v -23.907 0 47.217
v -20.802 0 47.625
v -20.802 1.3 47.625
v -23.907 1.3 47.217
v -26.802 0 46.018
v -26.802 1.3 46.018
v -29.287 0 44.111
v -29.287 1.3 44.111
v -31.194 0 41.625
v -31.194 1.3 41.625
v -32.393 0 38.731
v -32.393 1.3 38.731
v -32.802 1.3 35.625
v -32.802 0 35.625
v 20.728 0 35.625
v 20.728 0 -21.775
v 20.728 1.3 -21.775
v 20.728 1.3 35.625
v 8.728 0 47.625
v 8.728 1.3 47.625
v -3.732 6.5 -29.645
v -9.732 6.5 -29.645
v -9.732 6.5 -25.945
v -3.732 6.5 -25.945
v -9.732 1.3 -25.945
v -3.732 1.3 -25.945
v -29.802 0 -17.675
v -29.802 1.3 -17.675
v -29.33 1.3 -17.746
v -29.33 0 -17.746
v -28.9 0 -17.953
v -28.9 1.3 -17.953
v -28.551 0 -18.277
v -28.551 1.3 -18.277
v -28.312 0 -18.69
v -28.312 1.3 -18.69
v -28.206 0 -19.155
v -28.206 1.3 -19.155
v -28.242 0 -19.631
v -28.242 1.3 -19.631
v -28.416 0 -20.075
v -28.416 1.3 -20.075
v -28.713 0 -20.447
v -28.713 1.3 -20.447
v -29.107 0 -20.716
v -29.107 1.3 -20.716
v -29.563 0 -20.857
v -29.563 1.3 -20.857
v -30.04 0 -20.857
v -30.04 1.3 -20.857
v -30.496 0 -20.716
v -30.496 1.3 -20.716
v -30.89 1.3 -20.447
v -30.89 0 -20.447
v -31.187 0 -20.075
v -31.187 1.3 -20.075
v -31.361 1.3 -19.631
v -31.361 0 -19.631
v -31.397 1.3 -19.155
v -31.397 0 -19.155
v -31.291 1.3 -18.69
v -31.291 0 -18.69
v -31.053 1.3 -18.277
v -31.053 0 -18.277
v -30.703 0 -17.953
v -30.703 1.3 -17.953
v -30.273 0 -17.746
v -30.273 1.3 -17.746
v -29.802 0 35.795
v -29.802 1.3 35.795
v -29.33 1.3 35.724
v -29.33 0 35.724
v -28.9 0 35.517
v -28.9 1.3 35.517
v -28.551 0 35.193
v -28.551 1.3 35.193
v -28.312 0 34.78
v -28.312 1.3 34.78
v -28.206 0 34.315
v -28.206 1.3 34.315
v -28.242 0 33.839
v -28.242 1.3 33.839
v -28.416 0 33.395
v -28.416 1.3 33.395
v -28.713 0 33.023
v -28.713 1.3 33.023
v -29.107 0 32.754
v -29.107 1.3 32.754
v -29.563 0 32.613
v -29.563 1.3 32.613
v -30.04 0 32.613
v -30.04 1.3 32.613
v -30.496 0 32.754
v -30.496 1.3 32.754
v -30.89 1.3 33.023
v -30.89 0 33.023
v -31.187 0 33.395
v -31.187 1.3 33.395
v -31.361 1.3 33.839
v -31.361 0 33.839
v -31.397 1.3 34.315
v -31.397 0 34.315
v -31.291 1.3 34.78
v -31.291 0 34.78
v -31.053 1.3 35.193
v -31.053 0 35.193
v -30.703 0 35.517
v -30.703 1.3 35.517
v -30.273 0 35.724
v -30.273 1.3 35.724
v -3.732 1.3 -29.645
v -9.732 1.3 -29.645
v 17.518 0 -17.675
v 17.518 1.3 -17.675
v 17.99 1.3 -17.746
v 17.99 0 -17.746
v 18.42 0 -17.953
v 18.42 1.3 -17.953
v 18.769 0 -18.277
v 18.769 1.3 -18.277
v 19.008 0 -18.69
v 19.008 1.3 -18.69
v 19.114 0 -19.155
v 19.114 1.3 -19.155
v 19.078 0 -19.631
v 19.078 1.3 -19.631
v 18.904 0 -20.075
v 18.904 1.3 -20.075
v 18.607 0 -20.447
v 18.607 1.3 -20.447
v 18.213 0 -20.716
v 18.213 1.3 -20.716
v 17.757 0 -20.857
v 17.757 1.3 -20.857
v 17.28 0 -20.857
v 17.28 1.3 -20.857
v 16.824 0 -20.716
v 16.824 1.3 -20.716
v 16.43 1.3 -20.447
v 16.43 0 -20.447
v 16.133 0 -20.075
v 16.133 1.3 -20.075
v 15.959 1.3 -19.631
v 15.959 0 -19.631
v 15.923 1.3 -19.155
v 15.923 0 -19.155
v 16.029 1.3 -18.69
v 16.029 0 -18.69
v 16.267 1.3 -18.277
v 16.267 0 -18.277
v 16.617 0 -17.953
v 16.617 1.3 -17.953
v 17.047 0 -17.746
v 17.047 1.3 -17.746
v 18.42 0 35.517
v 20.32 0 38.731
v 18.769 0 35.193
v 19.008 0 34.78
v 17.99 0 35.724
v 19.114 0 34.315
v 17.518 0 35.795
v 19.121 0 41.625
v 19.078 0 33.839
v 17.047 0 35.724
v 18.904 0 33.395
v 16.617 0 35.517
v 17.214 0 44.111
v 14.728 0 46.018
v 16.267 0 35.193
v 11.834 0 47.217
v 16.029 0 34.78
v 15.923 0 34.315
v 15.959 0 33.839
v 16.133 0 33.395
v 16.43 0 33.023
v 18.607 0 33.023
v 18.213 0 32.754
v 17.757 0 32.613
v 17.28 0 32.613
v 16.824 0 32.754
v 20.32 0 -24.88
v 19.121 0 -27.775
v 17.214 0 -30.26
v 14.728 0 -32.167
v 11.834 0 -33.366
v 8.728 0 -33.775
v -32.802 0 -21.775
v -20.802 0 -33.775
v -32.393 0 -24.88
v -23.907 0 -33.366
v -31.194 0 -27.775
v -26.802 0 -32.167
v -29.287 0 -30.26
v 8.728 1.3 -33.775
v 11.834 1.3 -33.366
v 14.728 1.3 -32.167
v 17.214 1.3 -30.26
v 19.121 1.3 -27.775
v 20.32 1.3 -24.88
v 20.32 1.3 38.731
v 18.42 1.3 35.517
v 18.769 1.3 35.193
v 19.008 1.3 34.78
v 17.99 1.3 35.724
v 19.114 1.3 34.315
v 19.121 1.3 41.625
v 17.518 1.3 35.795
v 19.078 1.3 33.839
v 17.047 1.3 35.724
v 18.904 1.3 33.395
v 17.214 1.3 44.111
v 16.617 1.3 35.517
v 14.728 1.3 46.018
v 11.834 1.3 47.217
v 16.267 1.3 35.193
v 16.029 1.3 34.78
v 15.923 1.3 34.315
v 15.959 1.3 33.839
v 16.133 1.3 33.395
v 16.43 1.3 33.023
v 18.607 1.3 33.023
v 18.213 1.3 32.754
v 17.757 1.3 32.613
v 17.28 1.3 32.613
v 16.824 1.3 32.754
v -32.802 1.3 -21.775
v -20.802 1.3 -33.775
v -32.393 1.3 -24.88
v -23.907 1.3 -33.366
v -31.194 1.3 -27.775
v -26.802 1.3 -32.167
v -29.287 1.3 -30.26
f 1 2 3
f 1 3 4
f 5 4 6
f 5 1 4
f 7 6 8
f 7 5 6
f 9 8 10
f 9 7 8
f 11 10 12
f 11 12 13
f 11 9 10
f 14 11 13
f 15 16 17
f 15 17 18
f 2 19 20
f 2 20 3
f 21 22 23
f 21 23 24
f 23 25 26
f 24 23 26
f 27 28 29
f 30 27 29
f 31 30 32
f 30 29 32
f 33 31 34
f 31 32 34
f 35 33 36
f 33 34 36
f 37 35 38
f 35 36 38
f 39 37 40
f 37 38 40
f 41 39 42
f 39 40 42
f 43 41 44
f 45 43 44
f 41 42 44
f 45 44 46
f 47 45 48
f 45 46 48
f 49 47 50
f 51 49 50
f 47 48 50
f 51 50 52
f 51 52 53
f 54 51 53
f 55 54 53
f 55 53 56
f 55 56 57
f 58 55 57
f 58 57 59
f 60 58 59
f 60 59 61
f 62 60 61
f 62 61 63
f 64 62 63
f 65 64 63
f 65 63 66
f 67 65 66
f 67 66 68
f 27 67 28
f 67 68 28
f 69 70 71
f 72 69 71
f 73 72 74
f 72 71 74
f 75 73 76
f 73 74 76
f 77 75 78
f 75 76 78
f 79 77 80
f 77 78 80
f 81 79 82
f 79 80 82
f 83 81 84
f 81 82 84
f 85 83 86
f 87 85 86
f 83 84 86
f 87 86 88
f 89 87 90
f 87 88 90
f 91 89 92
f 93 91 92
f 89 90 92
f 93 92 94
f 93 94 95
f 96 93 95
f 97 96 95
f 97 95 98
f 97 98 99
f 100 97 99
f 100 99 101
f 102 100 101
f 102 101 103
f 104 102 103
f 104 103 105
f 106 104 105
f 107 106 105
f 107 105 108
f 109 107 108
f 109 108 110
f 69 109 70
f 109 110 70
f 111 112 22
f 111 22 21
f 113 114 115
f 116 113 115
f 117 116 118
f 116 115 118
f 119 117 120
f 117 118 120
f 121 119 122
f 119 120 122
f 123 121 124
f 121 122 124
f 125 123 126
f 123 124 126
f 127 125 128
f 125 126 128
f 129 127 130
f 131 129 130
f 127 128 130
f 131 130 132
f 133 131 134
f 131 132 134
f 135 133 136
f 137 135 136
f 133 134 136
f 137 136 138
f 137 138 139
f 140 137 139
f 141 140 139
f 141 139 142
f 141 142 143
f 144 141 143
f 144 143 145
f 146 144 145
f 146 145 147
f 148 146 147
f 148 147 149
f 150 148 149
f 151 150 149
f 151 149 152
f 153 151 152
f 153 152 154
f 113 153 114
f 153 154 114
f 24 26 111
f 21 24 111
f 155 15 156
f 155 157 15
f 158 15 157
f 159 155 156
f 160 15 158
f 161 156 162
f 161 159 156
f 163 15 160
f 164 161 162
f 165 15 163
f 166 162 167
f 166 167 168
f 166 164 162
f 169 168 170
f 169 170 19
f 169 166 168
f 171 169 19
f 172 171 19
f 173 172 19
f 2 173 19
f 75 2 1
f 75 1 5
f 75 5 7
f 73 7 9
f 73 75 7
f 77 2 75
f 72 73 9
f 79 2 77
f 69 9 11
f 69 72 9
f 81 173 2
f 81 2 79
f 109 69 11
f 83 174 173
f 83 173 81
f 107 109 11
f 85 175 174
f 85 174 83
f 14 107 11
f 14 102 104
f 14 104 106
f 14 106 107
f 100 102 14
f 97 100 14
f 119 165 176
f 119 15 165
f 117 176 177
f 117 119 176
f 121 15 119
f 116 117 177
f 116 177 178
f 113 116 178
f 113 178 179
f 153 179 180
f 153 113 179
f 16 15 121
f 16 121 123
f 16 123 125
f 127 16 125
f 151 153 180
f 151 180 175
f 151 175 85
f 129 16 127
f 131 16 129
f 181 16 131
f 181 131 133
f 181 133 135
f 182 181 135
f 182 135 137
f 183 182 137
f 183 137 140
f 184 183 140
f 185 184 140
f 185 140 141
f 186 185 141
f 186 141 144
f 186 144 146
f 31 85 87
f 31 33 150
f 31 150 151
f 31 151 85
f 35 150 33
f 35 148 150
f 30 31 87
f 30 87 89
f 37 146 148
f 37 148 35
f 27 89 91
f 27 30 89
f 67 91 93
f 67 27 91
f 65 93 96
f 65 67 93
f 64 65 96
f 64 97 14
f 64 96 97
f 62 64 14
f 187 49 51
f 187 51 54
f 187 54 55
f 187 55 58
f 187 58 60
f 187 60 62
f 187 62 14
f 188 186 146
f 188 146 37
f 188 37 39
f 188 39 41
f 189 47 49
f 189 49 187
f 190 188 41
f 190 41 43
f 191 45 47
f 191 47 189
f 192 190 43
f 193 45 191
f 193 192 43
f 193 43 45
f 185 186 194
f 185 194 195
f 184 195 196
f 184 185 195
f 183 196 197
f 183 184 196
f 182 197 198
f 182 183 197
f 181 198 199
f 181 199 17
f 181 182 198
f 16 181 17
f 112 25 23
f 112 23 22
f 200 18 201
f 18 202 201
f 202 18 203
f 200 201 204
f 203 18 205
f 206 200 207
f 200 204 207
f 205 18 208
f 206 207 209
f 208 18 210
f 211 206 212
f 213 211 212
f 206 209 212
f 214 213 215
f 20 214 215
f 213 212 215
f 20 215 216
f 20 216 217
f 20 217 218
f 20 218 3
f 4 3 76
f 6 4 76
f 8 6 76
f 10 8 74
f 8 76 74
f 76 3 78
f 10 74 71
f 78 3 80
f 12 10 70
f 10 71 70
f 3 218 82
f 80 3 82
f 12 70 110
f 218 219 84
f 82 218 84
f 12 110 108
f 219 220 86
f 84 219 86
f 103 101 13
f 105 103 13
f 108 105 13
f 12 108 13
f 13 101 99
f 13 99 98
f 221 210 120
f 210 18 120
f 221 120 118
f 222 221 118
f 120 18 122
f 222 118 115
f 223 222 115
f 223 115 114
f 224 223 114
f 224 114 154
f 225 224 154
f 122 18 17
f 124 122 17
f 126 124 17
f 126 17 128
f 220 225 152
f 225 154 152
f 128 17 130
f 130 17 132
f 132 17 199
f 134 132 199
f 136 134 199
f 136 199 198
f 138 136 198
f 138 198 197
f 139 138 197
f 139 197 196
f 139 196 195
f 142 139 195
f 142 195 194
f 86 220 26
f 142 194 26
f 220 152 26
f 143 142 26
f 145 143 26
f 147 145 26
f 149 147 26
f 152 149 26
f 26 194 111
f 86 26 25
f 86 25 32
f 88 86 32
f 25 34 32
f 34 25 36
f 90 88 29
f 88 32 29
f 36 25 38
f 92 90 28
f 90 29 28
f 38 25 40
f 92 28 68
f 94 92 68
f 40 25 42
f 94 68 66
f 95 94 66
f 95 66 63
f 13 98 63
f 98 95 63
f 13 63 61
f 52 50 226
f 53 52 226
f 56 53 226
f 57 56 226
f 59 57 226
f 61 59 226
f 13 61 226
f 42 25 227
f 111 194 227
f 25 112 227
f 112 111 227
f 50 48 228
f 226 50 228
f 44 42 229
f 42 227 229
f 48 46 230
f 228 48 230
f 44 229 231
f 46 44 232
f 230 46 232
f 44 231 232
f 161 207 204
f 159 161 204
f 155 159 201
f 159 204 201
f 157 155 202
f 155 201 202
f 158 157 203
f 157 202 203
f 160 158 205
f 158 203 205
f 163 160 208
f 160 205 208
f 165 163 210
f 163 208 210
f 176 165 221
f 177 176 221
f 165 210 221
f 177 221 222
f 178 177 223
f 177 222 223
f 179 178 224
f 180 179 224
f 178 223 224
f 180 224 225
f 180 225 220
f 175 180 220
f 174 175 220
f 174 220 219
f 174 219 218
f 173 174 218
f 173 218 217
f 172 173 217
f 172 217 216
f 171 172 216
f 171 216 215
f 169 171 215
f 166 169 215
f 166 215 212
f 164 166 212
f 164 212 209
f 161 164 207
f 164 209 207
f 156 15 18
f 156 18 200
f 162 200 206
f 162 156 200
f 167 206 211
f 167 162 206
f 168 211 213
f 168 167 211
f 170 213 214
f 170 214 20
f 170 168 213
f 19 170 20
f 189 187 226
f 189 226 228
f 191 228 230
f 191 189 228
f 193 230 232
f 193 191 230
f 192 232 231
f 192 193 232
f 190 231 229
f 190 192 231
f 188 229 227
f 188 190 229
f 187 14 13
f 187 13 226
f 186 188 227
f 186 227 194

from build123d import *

# Parameters (mm, degrees)
BOSS_EXTRUDE1_DEPTH = 1.3
SKETCH2_R           = 1.6
CUT_EXTRUDE1_DEPTH  = 1.3
SKETCH3_W           = 6
SKETCH3_H           = 3.7
BOSS_EXTRUDE2_DEPTH = 5.2


with BuildPart() as part:
    # Sketch1 → Boss-Extrude1 (new body)
    with BuildSketch(Plane(origin=(0, 0, 0), x_dir=(1, 0, 0), z_dir=(0, 1, 0))):
        with BuildLine():
            Line((-20.801575534, 33.774503622), (8.728424466, 33.774503622))
            ThreePointArc((8.728424466, 33.774503622), (17.21370584, 30.259784996), (20.728424466, 21.774503622))
            Line((20.728424466, 21.774503622), (20.728424466, -35.625496378))
            ThreePointArc((20.728424466, -35.625496378), (17.21370584, -44.110777752), (8.728424466, -47.625496378))
            Line((8.728424466, -47.625496378), (-20.801575534, -47.625496378))
            ThreePointArc((-20.801575534, -47.625496378), (-29.286856908, -44.110777752), (-32.801575534, -35.625496378))
            Line((-32.801575534, -35.625496378), (-32.801575534, 21.774503622))
            ThreePointArc((-32.801575534, 21.774503622), (-29.286856908, 30.259784996), (-20.801575534, 33.774503622))
        make_face()
    extrude(amount=BOSS_EXTRUDE1_DEPTH)

    # Sketch2 → Cut-Extrude1 (cut)
    with BuildSketch(Plane(origin=(0, 1.3, 0), x_dir=(1, 0, 0), z_dir=(0, 1, 0))):
        with Locations(Location((-29.801575534, 19.274503622, 0), (0, 0, 270))):
            Circle(SKETCH2_R)
        with Locations(Location((17.518424466, 19.274503622, 0), (0, 0, 270))):
            Circle(SKETCH2_R)
        with Locations(Location((17.518424466, -34.195496378, 0), (0, 0, 270))):
            Circle(SKETCH2_R)
        with Locations(Location((-29.801575534, -34.195496378, 0), (0, 0, 270))):
            Circle(SKETCH2_R)
    extrude(amount=-CUT_EXTRUDE1_DEPTH, mode=Mode.SUBTRACT)

    # Sketch3 → Boss-Extrude2 (add)
    with BuildSketch(Plane(origin=(0, 1.3, 0), x_dir=(1, 0, 0), z_dir=(0, 1, 0))):
        with Locations((-6.731575534, 27.794503622)):
            Rectangle(SKETCH3_W, SKETCH3_H)
    extrude(amount=BOSS_EXTRUDE2_DEPTH)


solid = part.part
